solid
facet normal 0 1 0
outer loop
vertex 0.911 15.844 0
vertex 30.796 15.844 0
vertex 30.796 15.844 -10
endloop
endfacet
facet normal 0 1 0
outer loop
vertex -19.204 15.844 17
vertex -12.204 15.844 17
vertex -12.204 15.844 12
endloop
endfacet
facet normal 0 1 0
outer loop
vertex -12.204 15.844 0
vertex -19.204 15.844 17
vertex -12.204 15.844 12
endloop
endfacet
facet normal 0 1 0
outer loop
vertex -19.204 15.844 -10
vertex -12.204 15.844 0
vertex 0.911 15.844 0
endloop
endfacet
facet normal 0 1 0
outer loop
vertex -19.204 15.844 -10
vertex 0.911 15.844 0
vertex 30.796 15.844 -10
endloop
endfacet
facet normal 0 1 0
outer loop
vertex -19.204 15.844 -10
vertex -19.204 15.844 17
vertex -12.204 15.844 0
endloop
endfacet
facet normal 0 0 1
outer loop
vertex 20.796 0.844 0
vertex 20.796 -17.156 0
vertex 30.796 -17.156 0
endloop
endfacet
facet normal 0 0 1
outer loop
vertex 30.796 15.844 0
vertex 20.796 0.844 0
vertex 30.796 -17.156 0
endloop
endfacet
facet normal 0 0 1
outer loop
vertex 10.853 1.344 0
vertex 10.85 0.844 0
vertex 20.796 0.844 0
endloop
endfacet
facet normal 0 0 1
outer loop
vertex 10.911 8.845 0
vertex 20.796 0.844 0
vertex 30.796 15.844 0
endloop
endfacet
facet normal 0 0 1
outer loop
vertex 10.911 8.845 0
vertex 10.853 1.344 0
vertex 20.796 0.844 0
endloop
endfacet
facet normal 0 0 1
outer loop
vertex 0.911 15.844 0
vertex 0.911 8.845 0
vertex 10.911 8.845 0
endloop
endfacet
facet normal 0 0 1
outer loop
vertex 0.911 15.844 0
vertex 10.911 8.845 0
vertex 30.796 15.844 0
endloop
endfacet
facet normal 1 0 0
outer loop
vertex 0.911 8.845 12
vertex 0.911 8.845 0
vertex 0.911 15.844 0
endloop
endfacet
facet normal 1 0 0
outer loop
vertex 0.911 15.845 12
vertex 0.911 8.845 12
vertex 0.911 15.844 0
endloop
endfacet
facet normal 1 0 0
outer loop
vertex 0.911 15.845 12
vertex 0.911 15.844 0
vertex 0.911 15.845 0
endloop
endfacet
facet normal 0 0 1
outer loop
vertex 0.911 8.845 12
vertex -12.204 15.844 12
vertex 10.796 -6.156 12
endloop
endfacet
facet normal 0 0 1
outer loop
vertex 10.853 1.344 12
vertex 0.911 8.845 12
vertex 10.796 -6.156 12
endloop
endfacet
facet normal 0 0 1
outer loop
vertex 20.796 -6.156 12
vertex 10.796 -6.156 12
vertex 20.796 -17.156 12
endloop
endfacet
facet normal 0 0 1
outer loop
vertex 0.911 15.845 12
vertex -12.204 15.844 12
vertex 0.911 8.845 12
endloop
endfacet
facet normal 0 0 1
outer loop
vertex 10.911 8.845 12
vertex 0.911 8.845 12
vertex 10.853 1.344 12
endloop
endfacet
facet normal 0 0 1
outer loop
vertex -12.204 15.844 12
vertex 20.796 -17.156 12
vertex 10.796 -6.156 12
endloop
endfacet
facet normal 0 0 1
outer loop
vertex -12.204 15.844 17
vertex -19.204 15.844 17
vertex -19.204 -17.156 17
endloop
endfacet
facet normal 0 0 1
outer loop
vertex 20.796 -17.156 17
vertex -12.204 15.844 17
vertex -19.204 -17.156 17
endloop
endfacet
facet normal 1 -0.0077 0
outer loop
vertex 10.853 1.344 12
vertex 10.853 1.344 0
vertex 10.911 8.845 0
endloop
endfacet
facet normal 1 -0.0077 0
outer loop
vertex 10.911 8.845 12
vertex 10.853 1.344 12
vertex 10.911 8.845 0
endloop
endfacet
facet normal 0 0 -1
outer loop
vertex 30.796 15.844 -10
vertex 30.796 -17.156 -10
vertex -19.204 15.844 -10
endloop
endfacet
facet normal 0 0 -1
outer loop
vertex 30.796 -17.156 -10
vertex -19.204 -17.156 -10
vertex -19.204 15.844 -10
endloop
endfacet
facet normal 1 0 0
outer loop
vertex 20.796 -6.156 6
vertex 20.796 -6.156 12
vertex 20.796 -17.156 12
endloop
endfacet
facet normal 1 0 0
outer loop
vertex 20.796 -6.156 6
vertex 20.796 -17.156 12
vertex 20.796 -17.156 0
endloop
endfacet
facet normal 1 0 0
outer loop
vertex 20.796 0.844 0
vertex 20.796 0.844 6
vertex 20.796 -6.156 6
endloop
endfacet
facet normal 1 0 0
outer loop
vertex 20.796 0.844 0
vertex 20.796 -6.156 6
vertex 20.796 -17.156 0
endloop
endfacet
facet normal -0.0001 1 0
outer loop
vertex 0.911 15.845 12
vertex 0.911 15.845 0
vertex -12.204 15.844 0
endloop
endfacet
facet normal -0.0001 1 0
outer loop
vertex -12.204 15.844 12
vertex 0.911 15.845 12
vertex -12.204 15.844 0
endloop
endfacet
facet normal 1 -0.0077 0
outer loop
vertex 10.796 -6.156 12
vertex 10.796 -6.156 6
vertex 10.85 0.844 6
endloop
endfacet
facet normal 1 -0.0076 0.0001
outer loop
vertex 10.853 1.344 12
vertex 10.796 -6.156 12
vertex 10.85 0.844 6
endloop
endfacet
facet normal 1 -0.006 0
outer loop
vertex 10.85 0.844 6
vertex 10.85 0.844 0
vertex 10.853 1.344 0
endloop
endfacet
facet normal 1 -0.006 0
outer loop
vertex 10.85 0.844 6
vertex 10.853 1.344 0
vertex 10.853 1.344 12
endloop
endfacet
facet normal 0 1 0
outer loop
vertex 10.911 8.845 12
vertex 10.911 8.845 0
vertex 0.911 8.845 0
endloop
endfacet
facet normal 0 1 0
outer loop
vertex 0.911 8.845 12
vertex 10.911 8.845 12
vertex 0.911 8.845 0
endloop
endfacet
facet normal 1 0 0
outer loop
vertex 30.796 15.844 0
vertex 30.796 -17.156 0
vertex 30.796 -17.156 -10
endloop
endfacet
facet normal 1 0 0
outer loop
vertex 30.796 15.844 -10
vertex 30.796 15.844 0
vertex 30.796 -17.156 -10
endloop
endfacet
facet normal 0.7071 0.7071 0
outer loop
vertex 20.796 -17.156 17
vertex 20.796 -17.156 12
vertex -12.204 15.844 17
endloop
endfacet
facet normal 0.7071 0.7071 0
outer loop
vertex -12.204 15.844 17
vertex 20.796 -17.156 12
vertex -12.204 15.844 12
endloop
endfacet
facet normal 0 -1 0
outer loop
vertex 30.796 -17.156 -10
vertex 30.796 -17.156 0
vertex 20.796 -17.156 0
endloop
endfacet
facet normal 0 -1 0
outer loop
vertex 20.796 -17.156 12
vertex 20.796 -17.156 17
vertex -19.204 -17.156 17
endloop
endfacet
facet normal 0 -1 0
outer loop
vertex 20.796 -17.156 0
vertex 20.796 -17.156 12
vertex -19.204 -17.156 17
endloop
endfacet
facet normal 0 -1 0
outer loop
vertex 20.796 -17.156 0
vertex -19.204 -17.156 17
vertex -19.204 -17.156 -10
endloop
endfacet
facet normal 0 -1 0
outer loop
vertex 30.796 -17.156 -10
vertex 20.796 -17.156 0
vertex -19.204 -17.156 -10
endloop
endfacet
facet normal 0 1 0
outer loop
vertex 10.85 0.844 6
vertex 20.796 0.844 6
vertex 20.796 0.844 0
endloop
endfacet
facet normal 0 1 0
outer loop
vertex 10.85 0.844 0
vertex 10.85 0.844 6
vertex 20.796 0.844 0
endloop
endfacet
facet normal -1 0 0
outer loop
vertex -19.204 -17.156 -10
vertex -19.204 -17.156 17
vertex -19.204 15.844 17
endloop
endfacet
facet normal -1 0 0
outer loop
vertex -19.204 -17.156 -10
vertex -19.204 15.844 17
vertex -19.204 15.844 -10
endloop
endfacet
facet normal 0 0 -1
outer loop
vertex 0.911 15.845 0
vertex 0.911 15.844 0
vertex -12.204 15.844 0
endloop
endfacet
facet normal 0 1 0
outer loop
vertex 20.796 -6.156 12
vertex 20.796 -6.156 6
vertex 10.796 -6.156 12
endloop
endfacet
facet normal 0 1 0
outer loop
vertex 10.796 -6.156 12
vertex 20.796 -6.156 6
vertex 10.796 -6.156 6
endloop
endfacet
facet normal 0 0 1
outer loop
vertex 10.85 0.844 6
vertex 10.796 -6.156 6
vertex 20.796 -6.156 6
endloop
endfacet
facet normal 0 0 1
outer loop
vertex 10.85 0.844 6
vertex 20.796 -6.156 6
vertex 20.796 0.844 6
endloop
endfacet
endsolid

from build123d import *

# Parameters (mm, degrees)
EXTRUDE_1_DEPTH = 17
EXTRUDE_2_DEPTH = 12
SKETCH_3_W      = 6
SKETCH_3_H      = 7
EXTRUDE_3_DEPTH = 12
SKETCH_4_W      = 10
SKETCH_4_H      = 33
EXTRUDE_4_DEPTH = 40
SKETCH_10_W     = 10
SKETCH_10_H     = 33
EXTRUDE_5_DEPTH = 10


with BuildPart() as part:
    # 草圖2 → 填料-伸長1 (new body)
    with BuildSketch(Plane.XY):
        Polygon((-19.204371621, 15.843606587), (-19.204371621, -17.156393413), (20.795628379, -17.156393413), (-12.204371621, 15.843606587), align=None)
    extrude(amount=EXTRUDE_1_DEPTH)

    # 草圖2<3> → 填料-伸長2 (add)
    with BuildSketch(Plane.XY):
        Polygon((0.911243772, 15.844973174), (-12.204371621, 15.843606587), (20.795628379, -17.156393413), (20.795628379, -6.156393413), (10.795628379, -6.156393413), (10.853436076, 1.344289881), (10.911243772, 8.844973174), (0.911243772, 8.844973174), align=None)
    extrude(amount=EXTRUDE_2_DEPTH)

    # 草圖3 → 填料-伸長3 (add)
    with BuildSketch(Plane(origin=(20.795628379, 0, 0), x_dir=(0, 0, -1), z_dir=(1, 0, 0))):
        with Locations((-3, -2.656393413)):
            Rectangle(SKETCH_3_W, SKETCH_3_H)
    extrude(amount=-EXTRUDE_3_DEPTH)



with BuildPart() as body_2:
    # 草圖4 → 填料-伸長4 (new body)
    with BuildSketch(Plane(origin=(20.795628379, 0, 0), x_dir=(0, 0, -1), z_dir=(1, 0, 0))):
        with Locations((5, -0.656393413)):
            Rectangle(SKETCH_4_W, SKETCH_4_H)
    extrude(amount=-EXTRUDE_4_DEPTH)


with BuildPart() as part_1:
    add(part.part)

    add(body_2.part)  # 填料-伸長5 merges body 2
    # 草圖10 → 填料-伸長5 (add)
    with BuildSketch(Plane(origin=(20.795628379, 0, 0), x_dir=(0, 0, -1), z_dir=(1, 0, 0))):
        with Locations((5, -0.656393413)):
            Rectangle(SKETCH_10_W, SKETCH_10_H)
    extrude(amount=EXTRUDE_5_DEPTH)


solid = part_1.part
